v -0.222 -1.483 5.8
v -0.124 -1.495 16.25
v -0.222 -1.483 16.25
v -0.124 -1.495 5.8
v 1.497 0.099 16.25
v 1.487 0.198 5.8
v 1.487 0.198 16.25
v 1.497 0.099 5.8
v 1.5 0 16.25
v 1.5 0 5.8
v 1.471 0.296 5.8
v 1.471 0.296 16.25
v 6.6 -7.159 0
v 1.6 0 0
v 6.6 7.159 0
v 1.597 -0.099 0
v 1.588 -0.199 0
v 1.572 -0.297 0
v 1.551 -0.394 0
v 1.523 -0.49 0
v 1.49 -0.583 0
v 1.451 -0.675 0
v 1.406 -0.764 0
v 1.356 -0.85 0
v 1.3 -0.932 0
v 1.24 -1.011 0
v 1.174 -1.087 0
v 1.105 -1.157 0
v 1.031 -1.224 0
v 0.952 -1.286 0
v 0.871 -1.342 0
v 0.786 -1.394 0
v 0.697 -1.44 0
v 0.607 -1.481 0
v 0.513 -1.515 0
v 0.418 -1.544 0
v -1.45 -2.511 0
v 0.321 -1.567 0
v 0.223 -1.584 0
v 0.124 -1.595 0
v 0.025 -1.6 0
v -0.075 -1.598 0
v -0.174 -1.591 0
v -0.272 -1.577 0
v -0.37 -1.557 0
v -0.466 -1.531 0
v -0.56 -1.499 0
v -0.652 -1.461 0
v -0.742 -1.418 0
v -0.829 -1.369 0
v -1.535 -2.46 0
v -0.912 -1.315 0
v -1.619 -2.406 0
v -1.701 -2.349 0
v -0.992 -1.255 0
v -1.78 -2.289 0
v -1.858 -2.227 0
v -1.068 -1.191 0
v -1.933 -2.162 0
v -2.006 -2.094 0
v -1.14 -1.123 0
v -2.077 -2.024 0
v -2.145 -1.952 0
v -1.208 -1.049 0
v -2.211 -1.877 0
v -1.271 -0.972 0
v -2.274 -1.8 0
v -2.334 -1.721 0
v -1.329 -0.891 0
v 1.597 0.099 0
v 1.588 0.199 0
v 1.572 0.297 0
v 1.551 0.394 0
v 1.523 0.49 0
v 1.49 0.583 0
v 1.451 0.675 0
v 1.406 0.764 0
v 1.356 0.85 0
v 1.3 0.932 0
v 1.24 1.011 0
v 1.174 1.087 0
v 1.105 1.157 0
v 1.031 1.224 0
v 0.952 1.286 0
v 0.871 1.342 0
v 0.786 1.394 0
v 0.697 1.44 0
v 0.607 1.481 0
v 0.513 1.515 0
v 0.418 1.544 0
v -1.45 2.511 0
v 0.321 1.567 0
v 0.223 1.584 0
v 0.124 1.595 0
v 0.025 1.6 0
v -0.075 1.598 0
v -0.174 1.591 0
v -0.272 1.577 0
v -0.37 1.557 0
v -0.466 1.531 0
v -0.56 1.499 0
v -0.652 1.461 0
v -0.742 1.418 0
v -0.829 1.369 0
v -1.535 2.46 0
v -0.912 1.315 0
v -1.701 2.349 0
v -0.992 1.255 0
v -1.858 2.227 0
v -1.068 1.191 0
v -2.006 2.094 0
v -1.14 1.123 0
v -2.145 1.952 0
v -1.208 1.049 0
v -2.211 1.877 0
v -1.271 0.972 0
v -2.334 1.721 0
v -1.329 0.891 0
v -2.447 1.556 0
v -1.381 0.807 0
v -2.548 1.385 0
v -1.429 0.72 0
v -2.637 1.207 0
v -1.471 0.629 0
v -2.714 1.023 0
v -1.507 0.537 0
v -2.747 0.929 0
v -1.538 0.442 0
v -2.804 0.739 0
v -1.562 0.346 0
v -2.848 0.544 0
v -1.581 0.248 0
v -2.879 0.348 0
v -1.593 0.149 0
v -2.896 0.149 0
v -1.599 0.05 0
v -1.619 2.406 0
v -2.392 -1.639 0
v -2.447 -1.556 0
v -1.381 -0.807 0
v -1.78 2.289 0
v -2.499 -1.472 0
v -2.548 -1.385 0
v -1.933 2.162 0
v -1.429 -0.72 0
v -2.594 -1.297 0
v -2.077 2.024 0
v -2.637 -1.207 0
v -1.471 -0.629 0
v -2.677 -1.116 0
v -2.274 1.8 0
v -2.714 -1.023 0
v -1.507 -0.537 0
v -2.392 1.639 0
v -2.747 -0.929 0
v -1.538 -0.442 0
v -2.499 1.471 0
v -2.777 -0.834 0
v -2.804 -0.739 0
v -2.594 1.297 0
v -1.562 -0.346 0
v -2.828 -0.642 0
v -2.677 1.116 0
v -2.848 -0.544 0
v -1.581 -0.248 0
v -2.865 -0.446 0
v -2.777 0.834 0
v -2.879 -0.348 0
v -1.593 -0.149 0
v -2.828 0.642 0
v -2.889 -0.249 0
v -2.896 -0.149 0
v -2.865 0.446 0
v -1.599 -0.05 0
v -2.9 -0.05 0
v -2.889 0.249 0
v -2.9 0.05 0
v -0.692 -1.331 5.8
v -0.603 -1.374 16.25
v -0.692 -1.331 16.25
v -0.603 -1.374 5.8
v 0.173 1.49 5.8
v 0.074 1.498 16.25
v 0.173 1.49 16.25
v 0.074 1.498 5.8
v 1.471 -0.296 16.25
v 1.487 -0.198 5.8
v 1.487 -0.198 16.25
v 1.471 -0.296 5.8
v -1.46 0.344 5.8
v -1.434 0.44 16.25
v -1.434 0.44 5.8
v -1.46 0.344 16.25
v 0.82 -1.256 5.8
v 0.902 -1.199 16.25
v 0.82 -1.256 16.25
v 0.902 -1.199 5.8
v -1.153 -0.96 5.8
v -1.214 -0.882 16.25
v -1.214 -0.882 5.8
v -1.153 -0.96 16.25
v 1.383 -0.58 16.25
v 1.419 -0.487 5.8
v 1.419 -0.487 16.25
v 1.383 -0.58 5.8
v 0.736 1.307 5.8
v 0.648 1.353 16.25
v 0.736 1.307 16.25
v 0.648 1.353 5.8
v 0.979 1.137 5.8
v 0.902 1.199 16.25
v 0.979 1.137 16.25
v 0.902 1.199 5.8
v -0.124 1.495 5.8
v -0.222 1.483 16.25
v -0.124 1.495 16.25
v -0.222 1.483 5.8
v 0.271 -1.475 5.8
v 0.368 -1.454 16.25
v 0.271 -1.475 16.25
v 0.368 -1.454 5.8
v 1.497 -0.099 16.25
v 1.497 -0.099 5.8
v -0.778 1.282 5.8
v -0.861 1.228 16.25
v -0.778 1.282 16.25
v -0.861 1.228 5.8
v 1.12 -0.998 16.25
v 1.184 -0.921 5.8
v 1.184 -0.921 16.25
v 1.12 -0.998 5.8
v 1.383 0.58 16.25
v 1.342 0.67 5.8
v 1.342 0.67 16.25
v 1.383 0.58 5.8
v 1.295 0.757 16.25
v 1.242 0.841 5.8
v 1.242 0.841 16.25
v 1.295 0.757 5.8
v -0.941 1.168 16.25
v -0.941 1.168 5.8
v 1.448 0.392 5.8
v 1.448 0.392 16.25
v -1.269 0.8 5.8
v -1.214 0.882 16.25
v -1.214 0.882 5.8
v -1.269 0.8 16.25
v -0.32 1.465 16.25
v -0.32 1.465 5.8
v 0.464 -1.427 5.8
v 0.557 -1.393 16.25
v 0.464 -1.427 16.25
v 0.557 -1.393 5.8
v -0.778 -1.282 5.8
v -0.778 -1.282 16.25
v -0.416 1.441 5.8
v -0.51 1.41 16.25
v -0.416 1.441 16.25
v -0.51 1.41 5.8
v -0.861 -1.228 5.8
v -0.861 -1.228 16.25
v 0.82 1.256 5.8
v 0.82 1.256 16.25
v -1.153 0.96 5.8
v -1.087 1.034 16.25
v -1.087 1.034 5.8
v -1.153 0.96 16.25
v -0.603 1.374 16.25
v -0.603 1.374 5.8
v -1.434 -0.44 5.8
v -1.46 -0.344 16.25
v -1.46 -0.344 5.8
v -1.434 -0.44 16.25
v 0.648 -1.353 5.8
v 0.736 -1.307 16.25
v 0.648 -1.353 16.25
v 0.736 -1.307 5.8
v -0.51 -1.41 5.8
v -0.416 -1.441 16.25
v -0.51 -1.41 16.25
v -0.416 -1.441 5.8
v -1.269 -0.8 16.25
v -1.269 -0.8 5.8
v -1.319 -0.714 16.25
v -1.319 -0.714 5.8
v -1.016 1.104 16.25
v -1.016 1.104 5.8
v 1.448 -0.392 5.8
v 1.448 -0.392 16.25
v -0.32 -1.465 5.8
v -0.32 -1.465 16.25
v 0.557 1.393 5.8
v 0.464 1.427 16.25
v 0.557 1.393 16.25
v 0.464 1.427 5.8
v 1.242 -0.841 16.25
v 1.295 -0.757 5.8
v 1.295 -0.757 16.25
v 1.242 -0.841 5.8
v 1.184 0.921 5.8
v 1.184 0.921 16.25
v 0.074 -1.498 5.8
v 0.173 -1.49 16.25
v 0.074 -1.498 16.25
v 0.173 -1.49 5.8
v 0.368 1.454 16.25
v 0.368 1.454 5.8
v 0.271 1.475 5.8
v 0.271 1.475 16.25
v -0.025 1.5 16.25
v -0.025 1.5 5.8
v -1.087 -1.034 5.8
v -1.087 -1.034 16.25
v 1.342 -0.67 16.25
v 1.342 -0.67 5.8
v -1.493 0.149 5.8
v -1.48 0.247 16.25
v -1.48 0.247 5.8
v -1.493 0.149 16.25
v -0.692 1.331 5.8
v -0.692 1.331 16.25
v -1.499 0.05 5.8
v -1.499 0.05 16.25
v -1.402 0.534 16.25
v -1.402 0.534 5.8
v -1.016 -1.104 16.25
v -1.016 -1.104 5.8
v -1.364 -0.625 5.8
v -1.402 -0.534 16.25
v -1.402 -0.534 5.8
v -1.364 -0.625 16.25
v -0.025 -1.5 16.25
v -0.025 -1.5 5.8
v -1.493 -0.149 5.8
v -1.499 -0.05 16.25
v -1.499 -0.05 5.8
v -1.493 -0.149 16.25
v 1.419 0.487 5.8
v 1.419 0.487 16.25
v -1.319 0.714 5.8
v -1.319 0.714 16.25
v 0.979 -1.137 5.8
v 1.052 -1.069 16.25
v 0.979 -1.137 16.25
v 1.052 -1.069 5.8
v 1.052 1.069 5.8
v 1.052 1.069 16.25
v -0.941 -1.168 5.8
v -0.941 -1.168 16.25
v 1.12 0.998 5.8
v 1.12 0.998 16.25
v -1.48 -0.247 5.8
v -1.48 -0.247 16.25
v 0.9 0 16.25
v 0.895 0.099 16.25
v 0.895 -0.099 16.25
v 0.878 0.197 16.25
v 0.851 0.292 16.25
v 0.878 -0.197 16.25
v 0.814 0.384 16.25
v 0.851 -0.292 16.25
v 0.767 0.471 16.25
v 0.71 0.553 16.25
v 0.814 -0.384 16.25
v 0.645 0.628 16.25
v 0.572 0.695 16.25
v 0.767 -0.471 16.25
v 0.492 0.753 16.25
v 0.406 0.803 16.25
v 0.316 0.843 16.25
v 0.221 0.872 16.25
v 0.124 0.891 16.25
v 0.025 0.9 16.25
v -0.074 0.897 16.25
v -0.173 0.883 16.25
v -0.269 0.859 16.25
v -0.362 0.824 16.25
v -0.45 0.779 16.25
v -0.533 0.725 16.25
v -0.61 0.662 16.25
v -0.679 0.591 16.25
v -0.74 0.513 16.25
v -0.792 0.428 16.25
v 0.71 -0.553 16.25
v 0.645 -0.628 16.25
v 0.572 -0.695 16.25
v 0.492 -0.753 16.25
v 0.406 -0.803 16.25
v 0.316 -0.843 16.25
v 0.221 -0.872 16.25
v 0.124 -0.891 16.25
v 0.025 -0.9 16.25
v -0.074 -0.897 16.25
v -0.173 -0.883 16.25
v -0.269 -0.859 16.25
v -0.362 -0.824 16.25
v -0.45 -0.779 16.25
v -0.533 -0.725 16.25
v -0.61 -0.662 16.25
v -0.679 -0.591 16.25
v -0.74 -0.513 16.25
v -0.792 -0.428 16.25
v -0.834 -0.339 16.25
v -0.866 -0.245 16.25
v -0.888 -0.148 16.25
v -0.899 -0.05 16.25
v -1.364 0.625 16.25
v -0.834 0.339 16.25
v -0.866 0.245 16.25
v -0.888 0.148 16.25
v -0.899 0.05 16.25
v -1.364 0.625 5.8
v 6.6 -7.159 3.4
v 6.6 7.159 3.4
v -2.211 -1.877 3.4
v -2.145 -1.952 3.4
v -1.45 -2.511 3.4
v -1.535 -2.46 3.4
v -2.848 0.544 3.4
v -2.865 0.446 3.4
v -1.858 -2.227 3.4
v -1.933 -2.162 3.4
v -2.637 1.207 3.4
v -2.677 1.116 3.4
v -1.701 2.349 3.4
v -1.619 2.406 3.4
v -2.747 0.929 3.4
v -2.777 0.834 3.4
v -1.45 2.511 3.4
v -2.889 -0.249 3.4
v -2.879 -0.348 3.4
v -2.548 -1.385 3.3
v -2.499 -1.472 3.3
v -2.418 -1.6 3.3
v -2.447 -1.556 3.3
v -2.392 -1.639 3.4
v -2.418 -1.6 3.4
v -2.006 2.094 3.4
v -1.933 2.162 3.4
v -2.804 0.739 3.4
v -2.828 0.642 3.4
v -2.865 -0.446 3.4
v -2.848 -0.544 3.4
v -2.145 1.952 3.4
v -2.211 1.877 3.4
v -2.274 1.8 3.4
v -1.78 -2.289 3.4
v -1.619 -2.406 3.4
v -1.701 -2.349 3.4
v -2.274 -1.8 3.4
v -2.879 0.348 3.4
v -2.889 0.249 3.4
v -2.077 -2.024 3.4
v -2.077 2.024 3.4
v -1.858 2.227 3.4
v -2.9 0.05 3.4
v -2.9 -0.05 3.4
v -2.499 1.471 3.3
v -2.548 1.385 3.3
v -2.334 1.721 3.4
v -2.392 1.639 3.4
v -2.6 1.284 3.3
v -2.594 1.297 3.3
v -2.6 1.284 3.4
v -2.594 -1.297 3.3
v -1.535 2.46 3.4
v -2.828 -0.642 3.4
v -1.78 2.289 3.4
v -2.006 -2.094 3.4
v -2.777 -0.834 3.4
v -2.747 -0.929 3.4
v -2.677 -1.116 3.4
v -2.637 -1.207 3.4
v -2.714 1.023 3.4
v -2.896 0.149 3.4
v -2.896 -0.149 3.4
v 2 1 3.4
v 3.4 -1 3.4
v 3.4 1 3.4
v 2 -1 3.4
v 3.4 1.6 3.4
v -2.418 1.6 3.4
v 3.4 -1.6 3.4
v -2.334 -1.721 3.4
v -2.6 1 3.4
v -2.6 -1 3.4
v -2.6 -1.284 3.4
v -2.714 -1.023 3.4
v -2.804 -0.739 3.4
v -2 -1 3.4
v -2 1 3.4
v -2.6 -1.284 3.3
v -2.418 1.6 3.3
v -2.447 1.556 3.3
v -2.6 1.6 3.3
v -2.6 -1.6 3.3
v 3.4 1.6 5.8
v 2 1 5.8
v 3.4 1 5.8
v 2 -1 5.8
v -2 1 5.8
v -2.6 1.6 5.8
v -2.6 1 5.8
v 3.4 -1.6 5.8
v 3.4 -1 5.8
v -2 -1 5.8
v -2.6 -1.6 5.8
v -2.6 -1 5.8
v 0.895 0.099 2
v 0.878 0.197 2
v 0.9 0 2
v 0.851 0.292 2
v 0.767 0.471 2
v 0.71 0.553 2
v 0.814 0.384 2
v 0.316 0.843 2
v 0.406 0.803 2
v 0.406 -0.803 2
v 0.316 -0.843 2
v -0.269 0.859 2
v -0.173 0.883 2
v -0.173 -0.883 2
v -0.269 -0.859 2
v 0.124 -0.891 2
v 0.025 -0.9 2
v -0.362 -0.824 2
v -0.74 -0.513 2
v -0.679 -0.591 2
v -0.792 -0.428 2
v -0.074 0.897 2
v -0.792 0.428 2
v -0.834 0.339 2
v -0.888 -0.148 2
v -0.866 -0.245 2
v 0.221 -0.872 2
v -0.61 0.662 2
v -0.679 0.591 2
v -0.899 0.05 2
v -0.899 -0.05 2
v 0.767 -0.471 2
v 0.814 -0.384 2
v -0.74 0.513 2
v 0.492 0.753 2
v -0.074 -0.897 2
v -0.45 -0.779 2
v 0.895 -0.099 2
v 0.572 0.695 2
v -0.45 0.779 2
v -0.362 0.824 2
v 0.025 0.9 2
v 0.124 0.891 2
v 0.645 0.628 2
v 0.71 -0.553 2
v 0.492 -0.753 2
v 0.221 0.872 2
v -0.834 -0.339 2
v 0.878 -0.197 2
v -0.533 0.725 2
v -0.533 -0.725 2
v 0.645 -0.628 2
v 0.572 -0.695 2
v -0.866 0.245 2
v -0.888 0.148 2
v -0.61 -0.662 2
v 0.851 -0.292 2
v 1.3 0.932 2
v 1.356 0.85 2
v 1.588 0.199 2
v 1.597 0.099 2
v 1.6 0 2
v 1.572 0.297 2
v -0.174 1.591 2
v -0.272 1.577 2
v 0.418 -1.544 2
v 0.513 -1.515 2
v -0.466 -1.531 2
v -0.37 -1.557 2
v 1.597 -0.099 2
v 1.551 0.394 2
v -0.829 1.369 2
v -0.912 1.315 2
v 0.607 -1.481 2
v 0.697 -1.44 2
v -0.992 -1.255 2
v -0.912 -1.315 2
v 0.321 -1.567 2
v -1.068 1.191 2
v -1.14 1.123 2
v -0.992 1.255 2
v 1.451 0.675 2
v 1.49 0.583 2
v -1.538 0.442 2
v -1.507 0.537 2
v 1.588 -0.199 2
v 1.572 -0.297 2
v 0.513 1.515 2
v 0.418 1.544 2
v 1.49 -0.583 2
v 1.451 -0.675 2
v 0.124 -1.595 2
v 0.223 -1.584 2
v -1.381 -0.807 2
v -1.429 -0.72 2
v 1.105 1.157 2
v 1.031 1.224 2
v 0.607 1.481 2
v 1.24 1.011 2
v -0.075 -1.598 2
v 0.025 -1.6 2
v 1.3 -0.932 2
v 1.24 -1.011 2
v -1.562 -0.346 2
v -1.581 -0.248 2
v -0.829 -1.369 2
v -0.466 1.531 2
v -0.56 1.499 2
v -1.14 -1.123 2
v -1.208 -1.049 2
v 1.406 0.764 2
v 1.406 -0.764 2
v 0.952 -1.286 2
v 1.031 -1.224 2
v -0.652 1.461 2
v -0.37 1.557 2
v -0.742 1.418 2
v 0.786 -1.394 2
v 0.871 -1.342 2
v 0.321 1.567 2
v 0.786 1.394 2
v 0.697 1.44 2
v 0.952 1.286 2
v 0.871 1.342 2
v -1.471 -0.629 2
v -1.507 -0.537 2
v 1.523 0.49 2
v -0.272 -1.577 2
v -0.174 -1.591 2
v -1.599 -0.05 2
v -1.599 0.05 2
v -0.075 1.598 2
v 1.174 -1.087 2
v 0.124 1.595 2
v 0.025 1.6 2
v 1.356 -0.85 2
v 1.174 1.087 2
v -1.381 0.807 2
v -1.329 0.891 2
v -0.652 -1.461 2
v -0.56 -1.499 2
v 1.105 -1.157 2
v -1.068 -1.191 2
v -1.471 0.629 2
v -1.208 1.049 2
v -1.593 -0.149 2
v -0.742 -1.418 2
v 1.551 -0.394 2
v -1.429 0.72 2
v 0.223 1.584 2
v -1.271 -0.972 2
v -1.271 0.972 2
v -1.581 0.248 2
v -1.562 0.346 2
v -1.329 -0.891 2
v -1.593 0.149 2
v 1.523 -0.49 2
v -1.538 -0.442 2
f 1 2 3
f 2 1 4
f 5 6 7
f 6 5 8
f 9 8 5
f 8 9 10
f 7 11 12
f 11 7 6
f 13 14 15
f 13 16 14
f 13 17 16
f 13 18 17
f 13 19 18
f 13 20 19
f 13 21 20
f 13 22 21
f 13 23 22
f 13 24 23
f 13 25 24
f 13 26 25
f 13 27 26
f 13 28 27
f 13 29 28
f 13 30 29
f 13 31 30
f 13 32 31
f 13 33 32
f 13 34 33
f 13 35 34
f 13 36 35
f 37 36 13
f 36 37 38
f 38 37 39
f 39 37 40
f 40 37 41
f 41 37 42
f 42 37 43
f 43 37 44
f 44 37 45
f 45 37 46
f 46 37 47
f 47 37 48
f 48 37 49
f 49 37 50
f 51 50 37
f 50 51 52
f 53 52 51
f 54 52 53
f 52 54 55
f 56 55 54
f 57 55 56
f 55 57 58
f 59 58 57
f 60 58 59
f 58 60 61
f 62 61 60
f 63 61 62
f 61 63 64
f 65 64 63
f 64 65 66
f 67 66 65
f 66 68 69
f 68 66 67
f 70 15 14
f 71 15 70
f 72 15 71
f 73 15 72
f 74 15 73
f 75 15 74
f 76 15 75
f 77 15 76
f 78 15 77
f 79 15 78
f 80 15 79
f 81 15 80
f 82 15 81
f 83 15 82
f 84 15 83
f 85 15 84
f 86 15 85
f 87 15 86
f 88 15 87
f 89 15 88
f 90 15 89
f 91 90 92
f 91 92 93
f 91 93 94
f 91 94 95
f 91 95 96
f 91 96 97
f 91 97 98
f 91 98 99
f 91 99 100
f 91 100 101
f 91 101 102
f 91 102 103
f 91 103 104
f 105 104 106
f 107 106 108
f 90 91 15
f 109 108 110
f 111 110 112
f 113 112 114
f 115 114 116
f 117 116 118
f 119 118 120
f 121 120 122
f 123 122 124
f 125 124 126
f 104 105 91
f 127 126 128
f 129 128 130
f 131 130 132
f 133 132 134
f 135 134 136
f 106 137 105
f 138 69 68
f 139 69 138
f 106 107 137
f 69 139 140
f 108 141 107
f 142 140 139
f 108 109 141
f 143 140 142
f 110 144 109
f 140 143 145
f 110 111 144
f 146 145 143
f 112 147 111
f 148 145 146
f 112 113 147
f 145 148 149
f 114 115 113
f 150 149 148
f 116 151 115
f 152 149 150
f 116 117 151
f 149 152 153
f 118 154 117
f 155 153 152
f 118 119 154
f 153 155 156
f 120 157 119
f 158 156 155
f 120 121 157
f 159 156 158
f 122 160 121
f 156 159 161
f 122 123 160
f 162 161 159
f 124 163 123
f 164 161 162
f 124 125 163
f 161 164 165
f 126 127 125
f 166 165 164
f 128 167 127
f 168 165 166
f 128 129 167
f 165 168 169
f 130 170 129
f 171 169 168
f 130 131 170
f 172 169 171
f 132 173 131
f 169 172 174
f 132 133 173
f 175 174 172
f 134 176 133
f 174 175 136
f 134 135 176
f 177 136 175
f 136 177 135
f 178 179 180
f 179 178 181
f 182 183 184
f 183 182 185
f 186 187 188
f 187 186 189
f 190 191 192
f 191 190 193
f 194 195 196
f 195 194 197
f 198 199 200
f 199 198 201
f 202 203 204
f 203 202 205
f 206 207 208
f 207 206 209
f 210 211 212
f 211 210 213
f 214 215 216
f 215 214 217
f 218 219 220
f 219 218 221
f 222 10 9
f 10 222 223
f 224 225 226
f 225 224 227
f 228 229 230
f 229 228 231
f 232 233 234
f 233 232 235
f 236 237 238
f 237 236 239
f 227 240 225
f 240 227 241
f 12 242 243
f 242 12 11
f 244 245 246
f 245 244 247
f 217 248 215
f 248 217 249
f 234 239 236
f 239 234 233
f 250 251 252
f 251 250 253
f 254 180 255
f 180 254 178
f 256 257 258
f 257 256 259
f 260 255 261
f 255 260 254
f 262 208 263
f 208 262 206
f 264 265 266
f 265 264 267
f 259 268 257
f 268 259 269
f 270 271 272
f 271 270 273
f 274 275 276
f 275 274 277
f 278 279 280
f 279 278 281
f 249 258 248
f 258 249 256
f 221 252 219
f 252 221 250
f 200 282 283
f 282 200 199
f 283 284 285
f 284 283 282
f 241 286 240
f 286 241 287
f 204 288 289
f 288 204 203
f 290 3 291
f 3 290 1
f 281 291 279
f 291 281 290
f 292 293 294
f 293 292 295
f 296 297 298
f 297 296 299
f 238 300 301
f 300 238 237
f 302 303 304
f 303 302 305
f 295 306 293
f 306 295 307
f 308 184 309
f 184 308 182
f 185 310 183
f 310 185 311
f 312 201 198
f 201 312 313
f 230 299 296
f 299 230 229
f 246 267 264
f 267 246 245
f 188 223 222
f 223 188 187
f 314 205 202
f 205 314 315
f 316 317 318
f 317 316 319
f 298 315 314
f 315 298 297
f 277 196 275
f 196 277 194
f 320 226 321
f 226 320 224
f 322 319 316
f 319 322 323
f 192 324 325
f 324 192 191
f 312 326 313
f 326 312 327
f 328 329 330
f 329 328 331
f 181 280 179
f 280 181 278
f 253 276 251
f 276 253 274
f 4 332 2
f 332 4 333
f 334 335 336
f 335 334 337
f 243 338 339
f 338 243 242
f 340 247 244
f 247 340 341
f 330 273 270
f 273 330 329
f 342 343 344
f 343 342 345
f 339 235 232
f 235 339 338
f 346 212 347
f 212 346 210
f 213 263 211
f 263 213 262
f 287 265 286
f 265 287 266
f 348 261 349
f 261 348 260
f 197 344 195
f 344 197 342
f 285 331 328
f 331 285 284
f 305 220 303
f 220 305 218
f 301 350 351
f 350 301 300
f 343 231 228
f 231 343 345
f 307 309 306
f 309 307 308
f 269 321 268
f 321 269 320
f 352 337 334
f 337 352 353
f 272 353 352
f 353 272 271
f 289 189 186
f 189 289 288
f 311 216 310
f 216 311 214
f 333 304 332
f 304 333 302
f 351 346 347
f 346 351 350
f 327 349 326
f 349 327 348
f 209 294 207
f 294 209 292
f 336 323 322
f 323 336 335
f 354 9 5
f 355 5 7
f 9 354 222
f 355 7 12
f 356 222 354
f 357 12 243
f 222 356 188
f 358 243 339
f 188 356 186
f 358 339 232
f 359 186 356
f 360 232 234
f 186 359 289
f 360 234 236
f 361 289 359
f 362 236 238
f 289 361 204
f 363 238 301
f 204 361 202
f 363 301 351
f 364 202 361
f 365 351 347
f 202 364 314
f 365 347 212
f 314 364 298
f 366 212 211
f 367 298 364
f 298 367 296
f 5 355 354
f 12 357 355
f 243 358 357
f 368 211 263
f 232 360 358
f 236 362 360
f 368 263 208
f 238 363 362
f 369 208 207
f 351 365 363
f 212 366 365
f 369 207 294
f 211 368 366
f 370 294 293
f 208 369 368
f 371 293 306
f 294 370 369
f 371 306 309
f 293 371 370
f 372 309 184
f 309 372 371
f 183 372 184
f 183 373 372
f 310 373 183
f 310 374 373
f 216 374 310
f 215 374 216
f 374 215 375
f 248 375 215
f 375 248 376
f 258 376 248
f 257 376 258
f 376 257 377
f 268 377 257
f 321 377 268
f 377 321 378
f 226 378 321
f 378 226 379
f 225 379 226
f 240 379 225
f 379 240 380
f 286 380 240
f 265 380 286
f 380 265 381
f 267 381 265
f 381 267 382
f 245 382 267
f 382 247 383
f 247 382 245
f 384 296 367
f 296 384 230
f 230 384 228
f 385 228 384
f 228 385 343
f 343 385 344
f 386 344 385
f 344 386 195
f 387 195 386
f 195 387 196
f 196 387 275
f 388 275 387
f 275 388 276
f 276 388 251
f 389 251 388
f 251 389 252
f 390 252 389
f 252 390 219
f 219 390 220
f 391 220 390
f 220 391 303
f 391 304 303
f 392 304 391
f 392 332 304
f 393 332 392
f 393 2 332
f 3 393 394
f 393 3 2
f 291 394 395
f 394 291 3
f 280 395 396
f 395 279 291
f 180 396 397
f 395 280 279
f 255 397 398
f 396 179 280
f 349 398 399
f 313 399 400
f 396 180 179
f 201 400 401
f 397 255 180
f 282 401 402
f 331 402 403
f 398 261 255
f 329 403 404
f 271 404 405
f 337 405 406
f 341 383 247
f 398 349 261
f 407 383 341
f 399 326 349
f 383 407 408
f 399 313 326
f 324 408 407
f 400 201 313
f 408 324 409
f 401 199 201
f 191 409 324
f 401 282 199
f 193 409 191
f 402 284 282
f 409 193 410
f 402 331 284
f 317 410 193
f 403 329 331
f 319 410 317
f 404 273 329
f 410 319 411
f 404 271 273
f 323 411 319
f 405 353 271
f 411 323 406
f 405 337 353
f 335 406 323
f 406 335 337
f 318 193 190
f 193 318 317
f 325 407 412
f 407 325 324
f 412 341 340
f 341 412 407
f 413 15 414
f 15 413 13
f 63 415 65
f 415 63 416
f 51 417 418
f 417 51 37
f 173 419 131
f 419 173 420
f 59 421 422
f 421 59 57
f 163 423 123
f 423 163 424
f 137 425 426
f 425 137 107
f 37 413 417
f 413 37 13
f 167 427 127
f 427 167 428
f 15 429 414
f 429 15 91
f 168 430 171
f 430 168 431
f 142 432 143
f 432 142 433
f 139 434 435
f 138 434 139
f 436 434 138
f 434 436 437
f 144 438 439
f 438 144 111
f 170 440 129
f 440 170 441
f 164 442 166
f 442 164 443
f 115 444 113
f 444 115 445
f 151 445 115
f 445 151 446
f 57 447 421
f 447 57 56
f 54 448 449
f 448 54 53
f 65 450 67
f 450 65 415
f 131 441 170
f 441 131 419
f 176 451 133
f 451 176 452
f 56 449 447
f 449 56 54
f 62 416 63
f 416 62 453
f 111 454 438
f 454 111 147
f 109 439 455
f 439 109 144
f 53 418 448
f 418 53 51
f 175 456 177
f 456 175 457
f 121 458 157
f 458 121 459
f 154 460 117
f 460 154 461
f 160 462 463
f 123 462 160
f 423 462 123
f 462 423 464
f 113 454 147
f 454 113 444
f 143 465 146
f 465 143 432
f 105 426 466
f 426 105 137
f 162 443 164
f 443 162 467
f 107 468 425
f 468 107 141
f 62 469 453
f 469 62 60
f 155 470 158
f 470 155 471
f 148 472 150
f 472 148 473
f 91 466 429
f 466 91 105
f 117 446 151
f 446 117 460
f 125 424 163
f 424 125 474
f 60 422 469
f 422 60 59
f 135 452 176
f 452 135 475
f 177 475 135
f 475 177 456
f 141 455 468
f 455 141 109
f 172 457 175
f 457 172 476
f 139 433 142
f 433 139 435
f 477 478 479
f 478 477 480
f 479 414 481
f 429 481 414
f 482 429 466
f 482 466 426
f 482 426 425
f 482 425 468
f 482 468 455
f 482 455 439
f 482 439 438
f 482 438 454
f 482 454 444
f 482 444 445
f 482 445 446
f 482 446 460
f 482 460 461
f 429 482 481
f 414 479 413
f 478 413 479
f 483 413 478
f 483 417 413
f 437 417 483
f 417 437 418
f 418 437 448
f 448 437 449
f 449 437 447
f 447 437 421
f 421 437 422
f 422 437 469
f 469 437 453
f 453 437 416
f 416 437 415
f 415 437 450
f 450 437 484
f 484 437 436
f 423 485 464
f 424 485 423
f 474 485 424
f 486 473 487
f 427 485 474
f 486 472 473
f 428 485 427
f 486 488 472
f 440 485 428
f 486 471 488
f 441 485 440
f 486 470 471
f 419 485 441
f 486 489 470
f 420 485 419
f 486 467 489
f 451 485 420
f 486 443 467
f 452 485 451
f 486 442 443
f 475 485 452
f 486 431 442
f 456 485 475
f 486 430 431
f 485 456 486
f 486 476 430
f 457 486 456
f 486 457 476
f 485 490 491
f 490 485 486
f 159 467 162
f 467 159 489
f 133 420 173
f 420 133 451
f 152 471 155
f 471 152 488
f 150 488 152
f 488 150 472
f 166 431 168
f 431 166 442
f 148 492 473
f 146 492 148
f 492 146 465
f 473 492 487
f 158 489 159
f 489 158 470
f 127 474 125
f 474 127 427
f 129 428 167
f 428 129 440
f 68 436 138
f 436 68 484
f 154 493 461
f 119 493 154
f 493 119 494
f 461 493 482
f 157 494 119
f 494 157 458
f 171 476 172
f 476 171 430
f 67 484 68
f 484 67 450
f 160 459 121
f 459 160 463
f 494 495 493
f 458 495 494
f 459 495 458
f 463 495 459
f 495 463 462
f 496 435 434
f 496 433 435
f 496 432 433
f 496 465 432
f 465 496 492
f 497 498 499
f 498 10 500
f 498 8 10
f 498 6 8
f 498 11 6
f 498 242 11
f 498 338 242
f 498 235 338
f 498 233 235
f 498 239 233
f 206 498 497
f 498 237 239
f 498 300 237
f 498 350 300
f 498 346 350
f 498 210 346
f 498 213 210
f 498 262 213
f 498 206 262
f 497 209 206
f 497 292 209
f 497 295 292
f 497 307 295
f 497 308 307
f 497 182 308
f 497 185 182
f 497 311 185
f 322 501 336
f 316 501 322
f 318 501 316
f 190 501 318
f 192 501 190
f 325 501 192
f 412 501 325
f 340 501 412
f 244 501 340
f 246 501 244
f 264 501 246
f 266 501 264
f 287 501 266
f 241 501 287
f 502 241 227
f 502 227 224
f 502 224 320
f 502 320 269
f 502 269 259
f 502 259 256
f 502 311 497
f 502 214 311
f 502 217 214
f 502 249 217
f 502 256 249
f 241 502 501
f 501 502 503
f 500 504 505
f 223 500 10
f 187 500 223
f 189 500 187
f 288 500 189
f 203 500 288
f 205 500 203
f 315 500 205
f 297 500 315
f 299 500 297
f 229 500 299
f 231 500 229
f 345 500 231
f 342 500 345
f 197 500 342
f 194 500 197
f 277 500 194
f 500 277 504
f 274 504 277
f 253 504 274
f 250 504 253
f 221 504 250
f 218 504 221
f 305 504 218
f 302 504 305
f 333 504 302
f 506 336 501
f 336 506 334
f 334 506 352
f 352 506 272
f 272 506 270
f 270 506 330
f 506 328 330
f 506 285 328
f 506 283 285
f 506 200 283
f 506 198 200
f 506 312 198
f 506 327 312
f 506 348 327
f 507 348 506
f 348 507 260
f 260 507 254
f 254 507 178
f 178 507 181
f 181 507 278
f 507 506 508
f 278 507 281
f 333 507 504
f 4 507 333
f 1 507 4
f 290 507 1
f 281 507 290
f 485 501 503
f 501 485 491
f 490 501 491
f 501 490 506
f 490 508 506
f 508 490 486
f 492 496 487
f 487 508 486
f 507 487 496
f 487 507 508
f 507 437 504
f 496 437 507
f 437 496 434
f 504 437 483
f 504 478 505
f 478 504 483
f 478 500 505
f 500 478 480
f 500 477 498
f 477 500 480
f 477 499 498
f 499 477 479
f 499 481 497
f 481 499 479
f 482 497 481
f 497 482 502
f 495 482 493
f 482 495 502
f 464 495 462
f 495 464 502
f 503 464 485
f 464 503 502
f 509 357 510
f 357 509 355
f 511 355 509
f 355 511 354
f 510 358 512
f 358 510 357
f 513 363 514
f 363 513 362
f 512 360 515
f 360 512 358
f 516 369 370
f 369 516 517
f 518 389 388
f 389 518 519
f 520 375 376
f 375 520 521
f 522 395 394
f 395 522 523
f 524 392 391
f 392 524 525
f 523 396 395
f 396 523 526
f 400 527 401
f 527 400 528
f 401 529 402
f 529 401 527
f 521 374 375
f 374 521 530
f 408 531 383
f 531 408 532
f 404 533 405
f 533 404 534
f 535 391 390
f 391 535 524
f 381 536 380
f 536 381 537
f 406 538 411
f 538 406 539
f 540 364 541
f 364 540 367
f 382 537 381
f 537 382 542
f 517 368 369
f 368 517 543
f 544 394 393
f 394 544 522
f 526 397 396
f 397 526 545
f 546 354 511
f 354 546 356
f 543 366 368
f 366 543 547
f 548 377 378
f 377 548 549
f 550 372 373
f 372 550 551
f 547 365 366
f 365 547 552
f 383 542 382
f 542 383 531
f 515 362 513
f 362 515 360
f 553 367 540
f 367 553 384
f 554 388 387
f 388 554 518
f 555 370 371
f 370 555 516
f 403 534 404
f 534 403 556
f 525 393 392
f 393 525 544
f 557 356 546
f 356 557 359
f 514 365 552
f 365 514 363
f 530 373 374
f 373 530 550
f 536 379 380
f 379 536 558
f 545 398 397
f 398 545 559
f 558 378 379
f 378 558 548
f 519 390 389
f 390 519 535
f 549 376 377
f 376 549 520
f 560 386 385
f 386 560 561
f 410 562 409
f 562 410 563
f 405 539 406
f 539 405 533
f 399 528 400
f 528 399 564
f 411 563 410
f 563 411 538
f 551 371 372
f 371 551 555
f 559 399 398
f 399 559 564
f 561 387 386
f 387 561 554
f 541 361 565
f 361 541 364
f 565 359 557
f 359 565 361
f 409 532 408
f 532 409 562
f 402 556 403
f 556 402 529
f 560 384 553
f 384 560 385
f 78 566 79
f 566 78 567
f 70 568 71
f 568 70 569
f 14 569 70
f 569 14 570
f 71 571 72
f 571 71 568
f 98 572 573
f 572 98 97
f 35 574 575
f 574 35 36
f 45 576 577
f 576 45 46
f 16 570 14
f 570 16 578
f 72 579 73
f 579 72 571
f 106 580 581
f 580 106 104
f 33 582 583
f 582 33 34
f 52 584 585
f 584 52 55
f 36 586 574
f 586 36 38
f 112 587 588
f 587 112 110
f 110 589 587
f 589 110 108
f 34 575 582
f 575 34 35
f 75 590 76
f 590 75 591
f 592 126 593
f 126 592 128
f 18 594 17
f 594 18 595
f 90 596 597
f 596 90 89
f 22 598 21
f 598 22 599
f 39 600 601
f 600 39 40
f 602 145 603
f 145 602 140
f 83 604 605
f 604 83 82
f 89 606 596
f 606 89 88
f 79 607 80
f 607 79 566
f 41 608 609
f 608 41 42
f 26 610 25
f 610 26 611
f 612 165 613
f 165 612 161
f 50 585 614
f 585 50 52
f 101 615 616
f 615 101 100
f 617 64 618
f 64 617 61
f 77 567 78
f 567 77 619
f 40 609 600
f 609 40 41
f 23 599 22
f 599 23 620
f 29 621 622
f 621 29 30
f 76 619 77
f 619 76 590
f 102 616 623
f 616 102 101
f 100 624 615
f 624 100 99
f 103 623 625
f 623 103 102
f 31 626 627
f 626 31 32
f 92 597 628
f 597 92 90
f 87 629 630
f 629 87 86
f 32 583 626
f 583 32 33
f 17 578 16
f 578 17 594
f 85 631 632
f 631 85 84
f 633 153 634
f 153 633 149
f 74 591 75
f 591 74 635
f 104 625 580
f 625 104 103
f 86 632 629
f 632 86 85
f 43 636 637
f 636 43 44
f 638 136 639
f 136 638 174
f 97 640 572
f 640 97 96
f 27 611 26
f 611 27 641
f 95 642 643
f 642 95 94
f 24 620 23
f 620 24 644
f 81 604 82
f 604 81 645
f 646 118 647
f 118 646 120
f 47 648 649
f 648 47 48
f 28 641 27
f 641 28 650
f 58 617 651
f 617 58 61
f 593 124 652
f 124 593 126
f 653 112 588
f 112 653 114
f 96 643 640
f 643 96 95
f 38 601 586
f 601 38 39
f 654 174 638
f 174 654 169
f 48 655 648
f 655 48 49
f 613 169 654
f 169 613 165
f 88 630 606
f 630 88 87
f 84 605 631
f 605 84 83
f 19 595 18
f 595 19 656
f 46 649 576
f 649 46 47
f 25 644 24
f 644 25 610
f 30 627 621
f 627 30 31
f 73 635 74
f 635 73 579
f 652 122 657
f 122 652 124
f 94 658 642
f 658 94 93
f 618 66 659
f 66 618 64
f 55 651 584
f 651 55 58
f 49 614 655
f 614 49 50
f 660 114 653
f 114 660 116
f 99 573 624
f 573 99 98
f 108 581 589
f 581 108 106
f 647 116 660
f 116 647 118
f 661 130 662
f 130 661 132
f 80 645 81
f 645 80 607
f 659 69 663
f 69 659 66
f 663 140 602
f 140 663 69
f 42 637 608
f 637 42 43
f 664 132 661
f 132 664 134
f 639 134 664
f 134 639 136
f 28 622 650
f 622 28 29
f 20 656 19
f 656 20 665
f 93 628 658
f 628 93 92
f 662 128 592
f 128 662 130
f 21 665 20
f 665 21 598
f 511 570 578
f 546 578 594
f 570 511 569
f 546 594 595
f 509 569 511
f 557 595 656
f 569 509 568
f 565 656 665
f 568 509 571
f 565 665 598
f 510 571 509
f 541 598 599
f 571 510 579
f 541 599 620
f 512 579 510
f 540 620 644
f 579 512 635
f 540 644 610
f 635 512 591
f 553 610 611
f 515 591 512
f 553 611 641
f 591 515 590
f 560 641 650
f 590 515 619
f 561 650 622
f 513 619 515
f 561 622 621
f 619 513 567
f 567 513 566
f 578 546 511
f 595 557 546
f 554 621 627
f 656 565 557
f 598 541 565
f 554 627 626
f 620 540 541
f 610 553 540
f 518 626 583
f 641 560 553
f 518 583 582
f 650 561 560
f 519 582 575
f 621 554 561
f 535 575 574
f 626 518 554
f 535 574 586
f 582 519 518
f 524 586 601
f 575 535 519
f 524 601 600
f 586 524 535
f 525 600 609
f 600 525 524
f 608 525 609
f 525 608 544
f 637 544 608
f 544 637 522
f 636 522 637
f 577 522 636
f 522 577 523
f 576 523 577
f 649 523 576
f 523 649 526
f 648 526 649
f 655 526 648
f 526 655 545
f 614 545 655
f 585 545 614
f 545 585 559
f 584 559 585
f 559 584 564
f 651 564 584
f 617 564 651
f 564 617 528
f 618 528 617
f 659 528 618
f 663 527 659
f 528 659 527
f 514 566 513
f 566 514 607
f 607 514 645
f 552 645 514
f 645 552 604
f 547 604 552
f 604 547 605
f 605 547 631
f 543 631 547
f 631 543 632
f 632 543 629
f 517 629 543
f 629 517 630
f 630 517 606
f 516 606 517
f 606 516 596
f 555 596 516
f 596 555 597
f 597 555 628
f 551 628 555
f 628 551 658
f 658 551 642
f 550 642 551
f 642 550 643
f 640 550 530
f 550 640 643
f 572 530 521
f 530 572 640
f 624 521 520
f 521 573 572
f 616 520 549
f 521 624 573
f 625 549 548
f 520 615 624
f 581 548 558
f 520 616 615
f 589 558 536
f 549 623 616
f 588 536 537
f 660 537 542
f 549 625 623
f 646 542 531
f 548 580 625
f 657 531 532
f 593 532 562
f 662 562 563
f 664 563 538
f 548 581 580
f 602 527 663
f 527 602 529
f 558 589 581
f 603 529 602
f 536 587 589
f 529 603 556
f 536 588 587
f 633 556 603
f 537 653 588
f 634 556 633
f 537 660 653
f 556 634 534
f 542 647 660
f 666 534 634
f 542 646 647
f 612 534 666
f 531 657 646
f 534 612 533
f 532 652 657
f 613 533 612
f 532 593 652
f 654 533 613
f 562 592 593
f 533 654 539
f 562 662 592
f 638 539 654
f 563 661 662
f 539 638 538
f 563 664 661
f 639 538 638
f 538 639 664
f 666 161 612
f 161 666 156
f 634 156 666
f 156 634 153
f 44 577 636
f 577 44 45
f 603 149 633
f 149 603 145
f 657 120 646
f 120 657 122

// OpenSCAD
part_angle = 60;
tube_h = 16.25;
tube_inner_d = 1.8;
tube_d = 3;
tube_inner_h = 2;
part_h = 3.4;
part_len = 9.5;
wall = 1.4;

tolerance = 0.1;


$fa = 0.1;
$fs = 0.1;

difference() {

union() {

    cylinder(d = tube_d, h = tube_h);

    linear_extrude(part_h)
    difference() {
        offset(tube_d / 2 + wall)
            polygon([[0,0], [cos(-part_angle/2) * 10, sin(-part_angle/2) * 10], [cos(part_angle/2) * 10, sin(part_angle/2) * 10]]);
        translate([part_len - tube_d/2 - wall, -50/2])
            square([50, 50]);
    }
    
    
    translate([0,0,part_h - tolerance])
    mount();
    
    
}

translate([0,0,-tolerance])
cylinder(d = tube_inner_d, h = tube_h + tolerance*2);

translate([0,0,-tolerance])
cylinder(d = tube_d + tolerance*2, h = tube_inner_h + tolerance);

}

module mount() {
    
    rail_width = 6;
    rail_thickness = 0.6;
    
    mount_height = 2.4;
    mount_width = 4;
    mount_thickness = 3.2;
    
    linear_extrude(mount_height + tolerance)
    translate([-mount_width/2,-mount_thickness/2]) {

        translate([-rail_thickness,0]) {
            square([rail_width, rail_thickness]);
            translate([0, mount_thickness - rail_thickness])
                square([rail_width, rail_thickness]);
        }
        square([mount_width, mount_thickness]);
        
    }

}
